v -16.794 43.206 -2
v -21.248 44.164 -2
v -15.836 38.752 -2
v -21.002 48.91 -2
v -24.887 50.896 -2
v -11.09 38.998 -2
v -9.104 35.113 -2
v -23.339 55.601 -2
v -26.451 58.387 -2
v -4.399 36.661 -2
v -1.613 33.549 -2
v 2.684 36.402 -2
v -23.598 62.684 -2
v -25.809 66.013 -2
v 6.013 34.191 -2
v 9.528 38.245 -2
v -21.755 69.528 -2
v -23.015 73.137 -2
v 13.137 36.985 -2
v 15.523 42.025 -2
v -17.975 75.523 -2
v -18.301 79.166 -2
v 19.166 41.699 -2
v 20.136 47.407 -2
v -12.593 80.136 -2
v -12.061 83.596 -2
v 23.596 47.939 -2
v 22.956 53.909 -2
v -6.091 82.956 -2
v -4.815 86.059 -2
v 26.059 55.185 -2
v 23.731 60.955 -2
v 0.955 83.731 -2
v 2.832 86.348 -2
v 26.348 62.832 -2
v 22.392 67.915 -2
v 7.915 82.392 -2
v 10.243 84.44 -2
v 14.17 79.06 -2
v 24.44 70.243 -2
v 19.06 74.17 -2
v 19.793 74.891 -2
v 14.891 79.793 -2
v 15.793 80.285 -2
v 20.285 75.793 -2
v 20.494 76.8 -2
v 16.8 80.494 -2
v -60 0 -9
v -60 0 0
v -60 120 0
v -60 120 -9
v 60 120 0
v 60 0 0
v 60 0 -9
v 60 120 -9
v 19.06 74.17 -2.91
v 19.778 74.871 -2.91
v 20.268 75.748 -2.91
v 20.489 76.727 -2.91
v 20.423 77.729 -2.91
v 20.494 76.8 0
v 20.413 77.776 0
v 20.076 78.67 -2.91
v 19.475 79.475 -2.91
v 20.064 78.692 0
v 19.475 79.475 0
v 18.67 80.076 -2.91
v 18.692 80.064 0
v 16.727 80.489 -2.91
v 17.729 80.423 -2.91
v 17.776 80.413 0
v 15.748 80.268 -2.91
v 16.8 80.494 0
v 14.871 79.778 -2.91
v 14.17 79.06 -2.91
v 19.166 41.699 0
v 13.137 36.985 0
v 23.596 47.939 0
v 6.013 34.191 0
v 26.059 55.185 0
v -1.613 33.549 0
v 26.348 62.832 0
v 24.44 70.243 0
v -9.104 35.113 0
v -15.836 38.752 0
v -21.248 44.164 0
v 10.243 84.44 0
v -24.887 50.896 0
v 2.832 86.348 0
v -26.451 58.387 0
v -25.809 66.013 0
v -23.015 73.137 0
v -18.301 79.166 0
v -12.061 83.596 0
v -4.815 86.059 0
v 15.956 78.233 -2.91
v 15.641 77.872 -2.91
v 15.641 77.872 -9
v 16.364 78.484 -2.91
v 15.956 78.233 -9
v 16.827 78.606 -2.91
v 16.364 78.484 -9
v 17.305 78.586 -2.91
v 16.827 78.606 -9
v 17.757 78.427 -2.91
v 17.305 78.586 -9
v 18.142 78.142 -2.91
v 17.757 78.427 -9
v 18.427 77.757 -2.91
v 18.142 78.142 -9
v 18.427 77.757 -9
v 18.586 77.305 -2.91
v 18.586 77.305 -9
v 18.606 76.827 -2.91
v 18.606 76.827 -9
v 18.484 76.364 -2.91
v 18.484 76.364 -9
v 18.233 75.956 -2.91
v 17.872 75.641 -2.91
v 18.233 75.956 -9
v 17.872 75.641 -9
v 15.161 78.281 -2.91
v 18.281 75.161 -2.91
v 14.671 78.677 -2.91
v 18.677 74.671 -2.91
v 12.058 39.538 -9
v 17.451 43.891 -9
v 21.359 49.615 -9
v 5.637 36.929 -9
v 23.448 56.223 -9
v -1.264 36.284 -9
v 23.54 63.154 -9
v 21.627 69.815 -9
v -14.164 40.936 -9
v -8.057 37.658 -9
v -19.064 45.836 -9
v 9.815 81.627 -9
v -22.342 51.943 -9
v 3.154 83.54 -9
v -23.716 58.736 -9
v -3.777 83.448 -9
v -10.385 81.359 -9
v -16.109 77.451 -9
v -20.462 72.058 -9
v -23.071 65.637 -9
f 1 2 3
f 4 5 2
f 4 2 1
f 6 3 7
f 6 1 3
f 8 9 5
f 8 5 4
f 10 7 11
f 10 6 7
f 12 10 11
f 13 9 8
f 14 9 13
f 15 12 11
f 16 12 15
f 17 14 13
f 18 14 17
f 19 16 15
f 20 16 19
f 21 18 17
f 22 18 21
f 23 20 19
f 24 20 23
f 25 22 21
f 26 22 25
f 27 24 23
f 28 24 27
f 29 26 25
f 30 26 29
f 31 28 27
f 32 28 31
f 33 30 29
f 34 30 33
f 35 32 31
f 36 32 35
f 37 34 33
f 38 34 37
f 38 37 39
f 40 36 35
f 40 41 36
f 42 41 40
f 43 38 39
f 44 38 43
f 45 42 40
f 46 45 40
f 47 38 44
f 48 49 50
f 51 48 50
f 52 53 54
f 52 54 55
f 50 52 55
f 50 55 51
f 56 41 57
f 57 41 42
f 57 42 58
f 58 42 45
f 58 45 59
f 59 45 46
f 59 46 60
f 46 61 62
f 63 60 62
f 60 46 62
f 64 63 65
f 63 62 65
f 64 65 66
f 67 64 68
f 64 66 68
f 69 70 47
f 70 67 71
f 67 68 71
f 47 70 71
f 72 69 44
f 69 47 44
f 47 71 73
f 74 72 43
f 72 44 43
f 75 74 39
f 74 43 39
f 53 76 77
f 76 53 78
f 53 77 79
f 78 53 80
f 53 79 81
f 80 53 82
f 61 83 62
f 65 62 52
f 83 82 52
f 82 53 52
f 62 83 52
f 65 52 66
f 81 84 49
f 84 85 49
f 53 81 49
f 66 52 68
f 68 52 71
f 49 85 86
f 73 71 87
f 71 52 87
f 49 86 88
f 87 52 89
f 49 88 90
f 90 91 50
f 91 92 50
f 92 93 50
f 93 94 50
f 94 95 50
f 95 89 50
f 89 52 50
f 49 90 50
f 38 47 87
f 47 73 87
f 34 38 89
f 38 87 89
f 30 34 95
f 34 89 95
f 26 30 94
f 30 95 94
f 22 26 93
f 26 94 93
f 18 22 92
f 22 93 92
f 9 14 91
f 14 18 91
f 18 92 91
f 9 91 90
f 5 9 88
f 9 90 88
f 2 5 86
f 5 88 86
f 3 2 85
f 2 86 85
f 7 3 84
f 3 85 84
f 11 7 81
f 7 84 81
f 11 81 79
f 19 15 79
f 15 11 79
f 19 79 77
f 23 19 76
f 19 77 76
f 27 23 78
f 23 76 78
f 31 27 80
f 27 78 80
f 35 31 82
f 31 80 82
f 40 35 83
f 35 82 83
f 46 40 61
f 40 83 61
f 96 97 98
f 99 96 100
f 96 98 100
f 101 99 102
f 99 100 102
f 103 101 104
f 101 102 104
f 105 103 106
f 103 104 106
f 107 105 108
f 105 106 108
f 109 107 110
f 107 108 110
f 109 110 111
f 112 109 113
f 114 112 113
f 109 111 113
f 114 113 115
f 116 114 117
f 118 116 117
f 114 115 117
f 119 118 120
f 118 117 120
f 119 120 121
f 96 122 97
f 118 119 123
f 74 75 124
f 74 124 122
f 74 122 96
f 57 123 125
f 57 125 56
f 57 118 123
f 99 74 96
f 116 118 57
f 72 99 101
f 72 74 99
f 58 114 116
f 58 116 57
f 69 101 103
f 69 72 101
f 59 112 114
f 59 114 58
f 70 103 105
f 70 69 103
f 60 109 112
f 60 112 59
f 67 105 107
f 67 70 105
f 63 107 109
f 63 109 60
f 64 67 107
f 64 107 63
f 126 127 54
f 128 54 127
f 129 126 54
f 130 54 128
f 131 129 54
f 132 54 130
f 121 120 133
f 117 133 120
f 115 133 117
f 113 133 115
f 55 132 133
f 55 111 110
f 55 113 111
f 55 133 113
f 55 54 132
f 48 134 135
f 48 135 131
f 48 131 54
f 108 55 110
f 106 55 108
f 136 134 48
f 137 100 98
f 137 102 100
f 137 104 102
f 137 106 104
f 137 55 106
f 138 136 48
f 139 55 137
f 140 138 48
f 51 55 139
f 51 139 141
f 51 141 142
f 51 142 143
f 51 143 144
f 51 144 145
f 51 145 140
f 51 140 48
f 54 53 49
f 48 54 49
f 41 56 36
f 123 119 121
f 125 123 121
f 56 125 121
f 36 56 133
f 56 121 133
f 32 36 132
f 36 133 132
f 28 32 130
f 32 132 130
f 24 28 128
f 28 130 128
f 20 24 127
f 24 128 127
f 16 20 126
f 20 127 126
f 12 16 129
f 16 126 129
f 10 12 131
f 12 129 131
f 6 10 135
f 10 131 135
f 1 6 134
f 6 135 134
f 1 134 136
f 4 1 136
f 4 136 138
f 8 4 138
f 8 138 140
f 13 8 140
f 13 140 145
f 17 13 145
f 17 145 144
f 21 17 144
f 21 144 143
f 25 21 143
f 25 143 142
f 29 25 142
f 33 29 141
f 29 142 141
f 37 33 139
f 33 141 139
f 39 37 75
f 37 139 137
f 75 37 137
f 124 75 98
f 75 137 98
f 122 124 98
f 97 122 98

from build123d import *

# Parameters (mm, degrees)
SKETCH_W            = 120
SKETCH_H            = 120
PAD_DEPTH           = 9
HOLE002_D           = 47.5
HOLE002_DEPTH       = 25
HOLE002_CBORE_D     = 53
HOLE002_CBORE_DEPTH = 2
CYLINDER_R          = 3.5
CYLINDER_DEPTH      = 39
HOLE003_D           = 3.23
HOLE003_CBORE_D     = 7
HOLE003_CBORE_DEPTH = 2.91


with BuildPart() as part:
    # Sketch → Pad (new body)
    with BuildSketch(Plane(origin=(0, 0, 0), x_dir=(-1, 0, 0), z_dir=(0, 0, -1))):
        with Locations((0, 60)):
            Rectangle(SKETCH_W, SKETCH_H)
    extrude(amount=PAD_DEPTH)

    # Hole002
    with Locations(Plane(origin=(0, 60, 0), x_dir=(1, 0, 0), z_dir=(0, 0, 1))):
        with Locations((0, 0)):
            CounterBoreHole(HOLE002_D / 2, HOLE002_CBORE_D / 2, HOLE002_CBORE_DEPTH, depth=HOLE002_DEPTH)

    # Cylinder → Cylinder (join)
    with BuildSketch(Plane(origin=(17, 77, 39), x_dir=(0, 1, 0), z_dir=(0, 0, 1))):
        Circle(CYLINDER_R)
    extrude(amount=CYLINDER_DEPTH)

    # Hole003 (through all)
    with Locations(Plane(origin=(0, 60, 0), x_dir=(1, 0, 0), z_dir=(0, 0, 1))):
        with Locations((17, 17)):
            CounterBoreHole(HOLE003_D / 2, HOLE003_CBORE_D / 2, HOLE003_CBORE_DEPTH)


solid = part.part
